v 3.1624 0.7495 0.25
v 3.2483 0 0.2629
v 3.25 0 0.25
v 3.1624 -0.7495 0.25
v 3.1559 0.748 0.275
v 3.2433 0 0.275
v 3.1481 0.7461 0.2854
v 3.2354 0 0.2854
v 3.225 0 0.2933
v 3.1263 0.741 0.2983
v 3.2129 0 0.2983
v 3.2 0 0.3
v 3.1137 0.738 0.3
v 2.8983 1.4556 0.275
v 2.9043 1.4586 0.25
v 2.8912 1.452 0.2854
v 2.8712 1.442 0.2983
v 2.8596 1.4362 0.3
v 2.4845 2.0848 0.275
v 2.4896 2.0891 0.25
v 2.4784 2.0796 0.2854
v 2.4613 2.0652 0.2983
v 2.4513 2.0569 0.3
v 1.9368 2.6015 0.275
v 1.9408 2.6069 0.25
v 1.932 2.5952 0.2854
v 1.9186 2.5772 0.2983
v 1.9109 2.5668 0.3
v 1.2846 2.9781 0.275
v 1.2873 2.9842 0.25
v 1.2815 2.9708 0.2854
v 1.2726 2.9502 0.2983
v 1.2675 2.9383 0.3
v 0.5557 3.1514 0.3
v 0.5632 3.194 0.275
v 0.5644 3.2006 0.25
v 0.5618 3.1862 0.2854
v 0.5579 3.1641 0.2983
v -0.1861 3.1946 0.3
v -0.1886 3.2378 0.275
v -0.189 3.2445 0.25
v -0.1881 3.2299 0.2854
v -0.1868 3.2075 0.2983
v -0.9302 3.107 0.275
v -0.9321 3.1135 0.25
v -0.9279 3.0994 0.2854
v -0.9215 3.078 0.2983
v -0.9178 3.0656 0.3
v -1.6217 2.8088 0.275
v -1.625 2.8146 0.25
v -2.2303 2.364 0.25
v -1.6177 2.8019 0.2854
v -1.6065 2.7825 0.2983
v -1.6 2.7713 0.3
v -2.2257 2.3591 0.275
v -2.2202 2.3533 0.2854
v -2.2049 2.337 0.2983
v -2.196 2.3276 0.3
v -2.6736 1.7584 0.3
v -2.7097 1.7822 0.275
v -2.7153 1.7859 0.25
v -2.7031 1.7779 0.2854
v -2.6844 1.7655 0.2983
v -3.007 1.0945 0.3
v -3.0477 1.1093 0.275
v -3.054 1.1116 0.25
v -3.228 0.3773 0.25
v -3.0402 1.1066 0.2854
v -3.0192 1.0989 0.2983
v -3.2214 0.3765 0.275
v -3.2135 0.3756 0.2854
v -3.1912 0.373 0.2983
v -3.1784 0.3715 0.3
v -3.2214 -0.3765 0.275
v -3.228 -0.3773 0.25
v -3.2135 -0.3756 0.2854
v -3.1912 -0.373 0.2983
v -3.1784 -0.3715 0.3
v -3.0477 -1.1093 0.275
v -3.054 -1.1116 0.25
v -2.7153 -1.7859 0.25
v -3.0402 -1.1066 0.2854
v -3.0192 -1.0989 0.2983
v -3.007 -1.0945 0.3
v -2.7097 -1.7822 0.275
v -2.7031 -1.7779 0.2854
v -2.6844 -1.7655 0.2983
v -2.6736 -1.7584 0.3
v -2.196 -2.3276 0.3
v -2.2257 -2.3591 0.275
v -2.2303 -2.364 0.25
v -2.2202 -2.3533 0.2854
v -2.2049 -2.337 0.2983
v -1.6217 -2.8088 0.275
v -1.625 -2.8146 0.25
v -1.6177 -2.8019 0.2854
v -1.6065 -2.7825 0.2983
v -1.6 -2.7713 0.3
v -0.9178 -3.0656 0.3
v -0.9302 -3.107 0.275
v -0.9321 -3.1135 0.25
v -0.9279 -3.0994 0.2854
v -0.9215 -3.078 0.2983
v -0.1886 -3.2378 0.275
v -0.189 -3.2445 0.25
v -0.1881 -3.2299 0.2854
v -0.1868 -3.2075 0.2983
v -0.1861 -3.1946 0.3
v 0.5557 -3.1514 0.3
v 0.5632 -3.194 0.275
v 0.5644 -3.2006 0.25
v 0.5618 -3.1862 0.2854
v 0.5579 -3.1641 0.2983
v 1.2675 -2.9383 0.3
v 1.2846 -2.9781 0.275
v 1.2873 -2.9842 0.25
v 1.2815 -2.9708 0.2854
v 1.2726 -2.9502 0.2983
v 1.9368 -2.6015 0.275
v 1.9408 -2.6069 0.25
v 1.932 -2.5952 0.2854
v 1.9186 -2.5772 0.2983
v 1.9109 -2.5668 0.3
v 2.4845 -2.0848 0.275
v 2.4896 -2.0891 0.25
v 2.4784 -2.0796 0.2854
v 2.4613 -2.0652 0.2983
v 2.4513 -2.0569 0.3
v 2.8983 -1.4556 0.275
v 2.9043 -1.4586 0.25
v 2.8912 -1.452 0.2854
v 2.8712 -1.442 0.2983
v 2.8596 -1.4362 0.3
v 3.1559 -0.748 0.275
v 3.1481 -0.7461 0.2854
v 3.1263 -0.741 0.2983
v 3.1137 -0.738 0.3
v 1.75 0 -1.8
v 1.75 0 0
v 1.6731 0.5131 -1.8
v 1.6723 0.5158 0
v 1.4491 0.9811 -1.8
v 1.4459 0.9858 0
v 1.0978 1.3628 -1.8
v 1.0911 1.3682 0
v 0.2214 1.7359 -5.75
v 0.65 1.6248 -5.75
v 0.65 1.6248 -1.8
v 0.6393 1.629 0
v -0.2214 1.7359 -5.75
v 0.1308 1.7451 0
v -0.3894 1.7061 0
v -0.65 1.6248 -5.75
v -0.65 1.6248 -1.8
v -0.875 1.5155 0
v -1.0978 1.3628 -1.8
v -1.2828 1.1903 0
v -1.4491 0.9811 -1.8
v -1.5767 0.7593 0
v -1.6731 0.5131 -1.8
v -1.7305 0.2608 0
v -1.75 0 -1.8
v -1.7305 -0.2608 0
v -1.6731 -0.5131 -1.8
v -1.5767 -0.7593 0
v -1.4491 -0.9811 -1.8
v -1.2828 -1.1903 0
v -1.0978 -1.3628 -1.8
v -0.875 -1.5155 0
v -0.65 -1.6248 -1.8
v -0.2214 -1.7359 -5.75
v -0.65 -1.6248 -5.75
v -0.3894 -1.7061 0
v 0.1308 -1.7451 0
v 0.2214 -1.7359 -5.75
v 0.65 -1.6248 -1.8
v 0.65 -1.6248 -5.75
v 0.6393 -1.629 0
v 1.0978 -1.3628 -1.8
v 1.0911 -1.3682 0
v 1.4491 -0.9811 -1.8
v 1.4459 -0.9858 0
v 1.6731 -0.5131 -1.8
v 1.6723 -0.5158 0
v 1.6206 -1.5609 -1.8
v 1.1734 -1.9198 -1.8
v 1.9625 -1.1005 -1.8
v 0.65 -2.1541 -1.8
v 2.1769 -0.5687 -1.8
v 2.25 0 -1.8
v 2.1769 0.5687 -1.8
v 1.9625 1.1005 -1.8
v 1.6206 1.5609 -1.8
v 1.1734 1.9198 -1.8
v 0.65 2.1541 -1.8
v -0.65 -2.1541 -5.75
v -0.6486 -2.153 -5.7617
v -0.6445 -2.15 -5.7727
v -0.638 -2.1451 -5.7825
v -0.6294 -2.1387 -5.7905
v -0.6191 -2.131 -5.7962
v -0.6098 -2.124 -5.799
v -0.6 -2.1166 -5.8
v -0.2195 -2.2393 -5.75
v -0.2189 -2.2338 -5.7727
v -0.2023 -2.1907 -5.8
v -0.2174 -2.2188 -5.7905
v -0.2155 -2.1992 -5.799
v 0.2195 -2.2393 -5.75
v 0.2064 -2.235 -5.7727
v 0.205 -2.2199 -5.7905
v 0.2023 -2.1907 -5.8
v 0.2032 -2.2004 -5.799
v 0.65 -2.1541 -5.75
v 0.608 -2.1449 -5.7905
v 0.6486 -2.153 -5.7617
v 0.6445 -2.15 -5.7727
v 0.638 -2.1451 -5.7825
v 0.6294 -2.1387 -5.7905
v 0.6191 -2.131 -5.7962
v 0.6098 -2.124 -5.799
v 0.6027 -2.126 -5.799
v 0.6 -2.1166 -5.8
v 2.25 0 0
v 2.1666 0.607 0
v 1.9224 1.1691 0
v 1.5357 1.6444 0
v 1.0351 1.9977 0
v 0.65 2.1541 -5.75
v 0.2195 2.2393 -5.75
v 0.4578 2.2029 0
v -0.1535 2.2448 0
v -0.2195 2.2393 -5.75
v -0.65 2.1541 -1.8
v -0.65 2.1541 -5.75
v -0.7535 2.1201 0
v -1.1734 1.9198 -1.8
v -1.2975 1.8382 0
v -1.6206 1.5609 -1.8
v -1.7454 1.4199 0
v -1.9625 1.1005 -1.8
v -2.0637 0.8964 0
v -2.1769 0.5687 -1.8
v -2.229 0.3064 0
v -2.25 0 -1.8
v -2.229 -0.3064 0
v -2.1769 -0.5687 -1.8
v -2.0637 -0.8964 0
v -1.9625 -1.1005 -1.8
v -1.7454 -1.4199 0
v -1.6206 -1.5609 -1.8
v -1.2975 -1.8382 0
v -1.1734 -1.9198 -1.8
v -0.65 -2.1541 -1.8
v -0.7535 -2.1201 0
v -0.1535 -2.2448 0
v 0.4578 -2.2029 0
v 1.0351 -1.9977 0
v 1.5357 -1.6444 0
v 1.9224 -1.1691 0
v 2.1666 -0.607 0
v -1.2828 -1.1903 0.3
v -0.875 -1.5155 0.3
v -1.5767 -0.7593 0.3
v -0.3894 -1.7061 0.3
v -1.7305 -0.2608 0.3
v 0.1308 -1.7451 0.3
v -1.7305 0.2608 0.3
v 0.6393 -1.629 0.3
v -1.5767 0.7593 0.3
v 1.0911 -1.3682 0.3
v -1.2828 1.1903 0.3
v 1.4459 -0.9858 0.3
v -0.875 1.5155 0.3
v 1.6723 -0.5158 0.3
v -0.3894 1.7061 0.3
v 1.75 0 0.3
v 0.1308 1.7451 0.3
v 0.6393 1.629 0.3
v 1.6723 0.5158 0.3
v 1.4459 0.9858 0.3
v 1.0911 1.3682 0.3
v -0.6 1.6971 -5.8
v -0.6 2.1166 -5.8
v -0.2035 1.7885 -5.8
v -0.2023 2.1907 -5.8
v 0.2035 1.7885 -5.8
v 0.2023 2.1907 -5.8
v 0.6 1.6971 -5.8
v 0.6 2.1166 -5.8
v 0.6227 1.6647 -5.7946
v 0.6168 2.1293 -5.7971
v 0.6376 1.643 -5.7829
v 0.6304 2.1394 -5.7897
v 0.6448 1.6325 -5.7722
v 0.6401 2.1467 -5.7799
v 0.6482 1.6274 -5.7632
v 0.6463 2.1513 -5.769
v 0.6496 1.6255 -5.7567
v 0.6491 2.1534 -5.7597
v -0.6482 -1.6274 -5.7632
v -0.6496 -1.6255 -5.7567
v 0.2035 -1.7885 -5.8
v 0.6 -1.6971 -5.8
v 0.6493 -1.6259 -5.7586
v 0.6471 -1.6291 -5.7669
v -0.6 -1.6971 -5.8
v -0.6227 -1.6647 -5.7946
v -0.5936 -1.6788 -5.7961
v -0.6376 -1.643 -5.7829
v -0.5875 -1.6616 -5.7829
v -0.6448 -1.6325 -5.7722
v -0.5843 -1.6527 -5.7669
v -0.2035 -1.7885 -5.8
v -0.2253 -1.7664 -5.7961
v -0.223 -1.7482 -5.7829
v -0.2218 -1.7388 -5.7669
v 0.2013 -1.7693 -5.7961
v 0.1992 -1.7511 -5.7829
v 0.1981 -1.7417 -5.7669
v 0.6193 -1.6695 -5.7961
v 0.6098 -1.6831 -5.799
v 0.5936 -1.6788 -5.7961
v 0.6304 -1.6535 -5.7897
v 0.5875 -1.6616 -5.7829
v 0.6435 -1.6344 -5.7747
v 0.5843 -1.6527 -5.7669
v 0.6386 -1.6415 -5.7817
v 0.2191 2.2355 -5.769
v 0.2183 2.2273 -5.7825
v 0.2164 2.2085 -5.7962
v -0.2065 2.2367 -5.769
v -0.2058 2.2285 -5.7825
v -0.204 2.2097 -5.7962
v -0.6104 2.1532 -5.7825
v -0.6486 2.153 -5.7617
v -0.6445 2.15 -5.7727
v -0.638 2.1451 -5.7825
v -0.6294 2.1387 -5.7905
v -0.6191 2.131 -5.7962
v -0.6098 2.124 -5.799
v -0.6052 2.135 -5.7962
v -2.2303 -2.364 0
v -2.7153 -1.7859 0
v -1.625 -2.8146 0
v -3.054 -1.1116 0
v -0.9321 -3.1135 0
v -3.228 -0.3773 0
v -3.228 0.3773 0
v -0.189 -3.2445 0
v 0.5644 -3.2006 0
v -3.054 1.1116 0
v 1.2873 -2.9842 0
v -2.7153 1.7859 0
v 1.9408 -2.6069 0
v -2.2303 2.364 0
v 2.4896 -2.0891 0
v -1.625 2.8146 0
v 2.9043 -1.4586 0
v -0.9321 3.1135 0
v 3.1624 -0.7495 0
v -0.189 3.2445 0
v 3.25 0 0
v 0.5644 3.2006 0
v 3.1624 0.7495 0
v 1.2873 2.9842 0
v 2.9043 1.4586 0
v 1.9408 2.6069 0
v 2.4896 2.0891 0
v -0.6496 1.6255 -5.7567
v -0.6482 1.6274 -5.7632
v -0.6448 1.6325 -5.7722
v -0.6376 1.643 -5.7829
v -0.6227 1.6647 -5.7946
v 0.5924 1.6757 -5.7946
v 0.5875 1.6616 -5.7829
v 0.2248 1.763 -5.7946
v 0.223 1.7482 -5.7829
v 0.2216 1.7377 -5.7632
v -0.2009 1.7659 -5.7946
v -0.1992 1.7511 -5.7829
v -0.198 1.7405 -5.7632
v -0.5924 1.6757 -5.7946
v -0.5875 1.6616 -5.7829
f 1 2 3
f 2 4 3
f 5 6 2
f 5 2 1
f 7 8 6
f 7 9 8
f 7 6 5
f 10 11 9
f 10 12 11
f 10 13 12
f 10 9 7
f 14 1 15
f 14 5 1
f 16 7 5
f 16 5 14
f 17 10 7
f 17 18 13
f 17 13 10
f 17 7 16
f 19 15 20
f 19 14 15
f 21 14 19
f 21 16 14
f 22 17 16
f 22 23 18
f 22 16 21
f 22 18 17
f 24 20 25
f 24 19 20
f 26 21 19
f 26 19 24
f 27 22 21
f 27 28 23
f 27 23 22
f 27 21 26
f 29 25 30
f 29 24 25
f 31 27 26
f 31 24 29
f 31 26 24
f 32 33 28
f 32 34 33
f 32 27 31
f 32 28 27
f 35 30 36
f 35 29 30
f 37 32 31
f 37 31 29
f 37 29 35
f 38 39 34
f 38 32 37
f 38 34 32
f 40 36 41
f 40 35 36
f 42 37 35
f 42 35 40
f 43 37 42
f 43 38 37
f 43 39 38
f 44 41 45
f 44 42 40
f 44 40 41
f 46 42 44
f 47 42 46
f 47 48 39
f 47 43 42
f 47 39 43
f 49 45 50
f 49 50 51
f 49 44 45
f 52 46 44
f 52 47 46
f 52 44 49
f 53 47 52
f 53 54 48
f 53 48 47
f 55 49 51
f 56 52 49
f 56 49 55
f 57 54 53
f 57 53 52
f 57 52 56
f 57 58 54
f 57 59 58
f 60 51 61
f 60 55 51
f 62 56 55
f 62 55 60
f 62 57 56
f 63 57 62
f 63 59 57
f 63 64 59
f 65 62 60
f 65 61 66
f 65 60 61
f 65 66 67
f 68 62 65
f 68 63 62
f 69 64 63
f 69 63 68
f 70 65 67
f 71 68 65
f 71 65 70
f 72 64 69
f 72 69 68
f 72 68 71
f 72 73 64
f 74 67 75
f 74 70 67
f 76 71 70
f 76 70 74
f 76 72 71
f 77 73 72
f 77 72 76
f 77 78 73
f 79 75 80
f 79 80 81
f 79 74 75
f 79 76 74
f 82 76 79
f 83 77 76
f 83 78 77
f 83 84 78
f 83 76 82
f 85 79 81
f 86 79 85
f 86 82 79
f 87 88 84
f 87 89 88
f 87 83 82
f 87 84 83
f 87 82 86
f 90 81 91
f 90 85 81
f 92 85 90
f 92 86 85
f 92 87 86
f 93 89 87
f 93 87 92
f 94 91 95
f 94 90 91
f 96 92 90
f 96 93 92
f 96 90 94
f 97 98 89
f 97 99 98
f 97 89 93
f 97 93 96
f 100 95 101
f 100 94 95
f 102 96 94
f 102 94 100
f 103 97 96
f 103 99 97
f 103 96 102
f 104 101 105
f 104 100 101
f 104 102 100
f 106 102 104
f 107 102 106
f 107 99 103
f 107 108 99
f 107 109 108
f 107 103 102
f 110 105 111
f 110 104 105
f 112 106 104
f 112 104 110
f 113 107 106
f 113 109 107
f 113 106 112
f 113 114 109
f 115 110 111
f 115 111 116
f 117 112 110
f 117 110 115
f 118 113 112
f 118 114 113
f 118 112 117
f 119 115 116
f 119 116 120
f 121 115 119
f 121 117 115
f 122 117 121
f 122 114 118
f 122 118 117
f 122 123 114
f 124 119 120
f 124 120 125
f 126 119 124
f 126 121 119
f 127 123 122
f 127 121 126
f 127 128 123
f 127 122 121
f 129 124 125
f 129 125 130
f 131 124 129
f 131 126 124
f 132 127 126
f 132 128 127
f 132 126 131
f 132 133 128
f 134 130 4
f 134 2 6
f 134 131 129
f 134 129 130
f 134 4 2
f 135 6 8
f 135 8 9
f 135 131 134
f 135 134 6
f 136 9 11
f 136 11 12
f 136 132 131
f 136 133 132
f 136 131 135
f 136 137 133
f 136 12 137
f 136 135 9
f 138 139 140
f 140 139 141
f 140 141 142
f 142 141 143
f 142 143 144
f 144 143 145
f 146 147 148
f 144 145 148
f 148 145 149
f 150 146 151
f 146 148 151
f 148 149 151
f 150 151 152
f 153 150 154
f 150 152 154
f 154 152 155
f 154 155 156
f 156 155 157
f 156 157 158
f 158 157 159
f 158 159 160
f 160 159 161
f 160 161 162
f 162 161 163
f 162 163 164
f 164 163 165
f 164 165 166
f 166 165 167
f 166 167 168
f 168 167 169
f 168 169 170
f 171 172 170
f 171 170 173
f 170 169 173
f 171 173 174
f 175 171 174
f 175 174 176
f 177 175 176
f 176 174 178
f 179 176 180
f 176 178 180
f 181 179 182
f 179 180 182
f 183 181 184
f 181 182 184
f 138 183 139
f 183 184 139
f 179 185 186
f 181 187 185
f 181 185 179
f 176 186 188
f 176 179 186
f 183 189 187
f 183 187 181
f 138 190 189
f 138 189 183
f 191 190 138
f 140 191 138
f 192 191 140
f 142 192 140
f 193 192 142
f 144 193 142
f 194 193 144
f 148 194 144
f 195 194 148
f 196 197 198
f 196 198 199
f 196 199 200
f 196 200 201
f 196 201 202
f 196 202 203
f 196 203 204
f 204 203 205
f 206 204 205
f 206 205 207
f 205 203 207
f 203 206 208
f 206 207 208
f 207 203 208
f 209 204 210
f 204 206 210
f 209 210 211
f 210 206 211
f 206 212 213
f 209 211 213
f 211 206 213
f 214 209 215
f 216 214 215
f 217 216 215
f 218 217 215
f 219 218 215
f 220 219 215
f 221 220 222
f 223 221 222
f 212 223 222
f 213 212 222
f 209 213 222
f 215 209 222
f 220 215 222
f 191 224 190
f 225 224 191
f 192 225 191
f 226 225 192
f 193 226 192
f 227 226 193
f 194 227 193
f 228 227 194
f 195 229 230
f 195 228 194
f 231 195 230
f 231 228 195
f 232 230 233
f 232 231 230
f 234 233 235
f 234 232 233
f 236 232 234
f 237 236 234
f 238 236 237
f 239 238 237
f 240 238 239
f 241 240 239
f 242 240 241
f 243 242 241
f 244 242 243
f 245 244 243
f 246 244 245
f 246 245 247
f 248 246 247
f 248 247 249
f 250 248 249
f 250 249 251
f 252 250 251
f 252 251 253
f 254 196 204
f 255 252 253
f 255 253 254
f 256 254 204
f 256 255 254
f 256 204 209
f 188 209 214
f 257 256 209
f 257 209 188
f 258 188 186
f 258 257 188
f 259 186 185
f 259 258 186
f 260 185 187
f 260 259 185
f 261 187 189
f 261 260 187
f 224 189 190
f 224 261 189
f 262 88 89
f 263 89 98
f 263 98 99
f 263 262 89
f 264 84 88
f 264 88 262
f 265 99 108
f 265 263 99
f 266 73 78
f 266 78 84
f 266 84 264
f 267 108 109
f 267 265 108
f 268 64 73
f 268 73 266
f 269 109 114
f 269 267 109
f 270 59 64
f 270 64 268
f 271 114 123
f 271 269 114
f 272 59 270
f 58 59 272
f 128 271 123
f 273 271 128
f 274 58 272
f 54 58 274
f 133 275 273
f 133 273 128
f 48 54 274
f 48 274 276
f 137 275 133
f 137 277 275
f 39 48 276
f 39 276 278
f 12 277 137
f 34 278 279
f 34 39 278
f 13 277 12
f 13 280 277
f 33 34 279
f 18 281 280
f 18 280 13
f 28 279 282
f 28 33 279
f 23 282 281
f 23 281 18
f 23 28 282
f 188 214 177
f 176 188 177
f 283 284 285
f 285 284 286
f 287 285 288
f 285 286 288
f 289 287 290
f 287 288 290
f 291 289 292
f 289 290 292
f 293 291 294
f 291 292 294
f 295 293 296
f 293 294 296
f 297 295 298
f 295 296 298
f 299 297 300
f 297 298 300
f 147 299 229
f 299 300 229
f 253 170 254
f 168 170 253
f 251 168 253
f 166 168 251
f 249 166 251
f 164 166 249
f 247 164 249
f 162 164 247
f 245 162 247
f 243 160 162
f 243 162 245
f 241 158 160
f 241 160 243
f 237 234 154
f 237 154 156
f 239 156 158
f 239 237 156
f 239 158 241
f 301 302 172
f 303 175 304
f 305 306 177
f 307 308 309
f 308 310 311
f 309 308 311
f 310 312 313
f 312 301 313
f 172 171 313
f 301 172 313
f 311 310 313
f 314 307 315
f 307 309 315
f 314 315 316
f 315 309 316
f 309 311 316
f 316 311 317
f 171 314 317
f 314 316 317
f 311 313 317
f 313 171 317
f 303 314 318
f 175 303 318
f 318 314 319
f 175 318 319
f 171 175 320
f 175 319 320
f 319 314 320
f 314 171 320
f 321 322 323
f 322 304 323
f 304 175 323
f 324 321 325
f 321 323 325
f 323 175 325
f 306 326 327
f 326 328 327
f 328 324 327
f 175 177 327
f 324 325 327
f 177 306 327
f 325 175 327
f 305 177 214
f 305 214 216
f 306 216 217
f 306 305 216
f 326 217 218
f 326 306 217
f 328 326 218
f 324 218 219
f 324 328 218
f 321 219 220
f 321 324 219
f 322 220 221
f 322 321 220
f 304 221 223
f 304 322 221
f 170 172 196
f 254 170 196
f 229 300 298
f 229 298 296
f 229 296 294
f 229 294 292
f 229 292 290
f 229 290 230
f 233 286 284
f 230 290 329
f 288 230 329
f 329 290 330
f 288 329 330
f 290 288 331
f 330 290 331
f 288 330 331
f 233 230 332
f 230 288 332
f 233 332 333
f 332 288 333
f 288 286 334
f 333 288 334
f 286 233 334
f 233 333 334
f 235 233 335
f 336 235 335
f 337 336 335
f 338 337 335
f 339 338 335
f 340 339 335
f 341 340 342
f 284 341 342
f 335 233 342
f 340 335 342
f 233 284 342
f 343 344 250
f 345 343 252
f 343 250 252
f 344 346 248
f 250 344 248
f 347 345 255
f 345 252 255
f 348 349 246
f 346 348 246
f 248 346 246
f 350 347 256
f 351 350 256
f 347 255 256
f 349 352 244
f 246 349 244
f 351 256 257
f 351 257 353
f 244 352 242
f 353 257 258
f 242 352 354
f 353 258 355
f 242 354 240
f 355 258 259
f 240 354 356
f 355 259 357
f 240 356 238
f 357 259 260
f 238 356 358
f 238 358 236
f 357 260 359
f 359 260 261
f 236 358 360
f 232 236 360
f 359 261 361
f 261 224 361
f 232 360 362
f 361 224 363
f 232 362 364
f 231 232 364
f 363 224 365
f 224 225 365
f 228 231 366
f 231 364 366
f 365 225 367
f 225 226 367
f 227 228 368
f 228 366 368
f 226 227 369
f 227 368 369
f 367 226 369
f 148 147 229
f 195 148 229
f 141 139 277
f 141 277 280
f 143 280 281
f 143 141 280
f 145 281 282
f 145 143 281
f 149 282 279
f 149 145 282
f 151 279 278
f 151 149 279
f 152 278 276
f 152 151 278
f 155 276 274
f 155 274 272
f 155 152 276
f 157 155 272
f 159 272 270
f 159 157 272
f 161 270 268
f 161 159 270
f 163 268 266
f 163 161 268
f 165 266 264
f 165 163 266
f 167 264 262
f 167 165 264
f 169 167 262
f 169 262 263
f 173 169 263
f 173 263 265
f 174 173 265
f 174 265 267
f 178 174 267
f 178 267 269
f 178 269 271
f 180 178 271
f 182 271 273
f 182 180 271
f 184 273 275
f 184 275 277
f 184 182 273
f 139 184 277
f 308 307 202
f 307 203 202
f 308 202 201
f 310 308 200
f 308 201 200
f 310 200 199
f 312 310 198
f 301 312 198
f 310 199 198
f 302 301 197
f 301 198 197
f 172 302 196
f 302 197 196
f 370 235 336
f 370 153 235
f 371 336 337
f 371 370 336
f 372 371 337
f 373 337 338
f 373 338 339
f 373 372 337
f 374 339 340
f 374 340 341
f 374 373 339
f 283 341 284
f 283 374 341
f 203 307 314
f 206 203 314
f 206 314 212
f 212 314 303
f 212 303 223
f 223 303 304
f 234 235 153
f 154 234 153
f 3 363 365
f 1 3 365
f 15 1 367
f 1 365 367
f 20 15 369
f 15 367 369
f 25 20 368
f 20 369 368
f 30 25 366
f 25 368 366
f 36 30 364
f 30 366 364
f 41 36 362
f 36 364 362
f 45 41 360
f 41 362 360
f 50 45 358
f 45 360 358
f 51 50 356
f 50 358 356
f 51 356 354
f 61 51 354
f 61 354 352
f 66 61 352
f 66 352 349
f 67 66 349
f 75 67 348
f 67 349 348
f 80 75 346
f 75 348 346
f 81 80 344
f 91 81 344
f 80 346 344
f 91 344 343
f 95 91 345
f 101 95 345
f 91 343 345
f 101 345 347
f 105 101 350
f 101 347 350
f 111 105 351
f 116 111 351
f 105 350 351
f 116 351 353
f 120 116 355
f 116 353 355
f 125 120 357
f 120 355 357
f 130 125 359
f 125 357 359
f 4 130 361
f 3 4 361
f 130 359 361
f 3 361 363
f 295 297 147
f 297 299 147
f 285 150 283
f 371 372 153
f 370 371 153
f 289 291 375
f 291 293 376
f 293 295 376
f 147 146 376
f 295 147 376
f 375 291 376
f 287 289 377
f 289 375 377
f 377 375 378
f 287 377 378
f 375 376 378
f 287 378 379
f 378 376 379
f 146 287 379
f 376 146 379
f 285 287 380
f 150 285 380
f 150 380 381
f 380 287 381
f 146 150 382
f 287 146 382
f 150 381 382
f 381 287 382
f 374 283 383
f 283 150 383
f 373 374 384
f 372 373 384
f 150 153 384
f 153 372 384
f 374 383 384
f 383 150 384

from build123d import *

# Parameters (mm, degrees)
SKETCH_1_R          = 3.25
SKETCH_1_R_2        = 2.25
SKETCH_1_R_3        = 1.75
EXTRUDE_1_DEPTH     = 0.3
SKETCH_1_4_R        = 2.25
SKETCH_1_4_R_2      = 1.75
EXTRUDE_2_DEPTH     = 5.8
CUT_EXTRUDE_1_DEPTH = 4
FILLET_1_R          = 0.05


with BuildPart() as part:
    # Sketch 1 → Extrude 1 (new body)
    with BuildSketch(Plane.XY):
        Circle(SKETCH_1_R)
        Circle(SKETCH_1_R_2, mode=Mode.SUBTRACT)
        Circle(SKETCH_1_R_2)
        Circle(SKETCH_1_R_3, mode=Mode.SUBTRACT)
    extrude(amount=EXTRUDE_1_DEPTH)

    # Sketch 1_4 → Extrude 2 (add)
    with BuildSketch(Plane.XY):
        Circle(SKETCH_1_4_R)
        Circle(SKETCH_1_4_R_2, mode=Mode.SUBTRACT)
    extrude(amount=-EXTRUDE_2_DEPTH)

    # Sketch 2 → Cut-Extrude 1 (cut)
    with BuildSketch(Plane(origin=(0, 0, -5.8), x_dir=(-1, 0, 0), z_dir=(0, 0, -1))):
        with BuildLine():
            ThreePointArc((-0.65, 2.154065923), (-2.25, 0), (-0.65, -2.154065923))
            Line((-0.65, -2.154065923), (-0.65, -1.624807681))
            ThreePointArc((-0.65, -1.624807681), (-1.75, 0), (-0.65, 1.624807681))
            Line((-0.65, 1.624807681), (-0.65, 2.154065923))
        make_face()
        with BuildLine():
            Line((0.65, -1.624807681), (0.65, -2.154065923))
            ThreePointArc((0.65, -2.154065923), (1.806239187, -1.341640786), (2.25, 0))
            ThreePointArc((2.25, 0), (1.806239187, 1.341640786), (0.65, 2.154065923))
            Line((0.65, 2.154065923), (0.65, 1.624807681))
            ThreePointArc((0.65, 1.624807681), (1.449137675, 0.981070844), (1.75, 0))
            ThreePointArc((1.75, 0), (1.449137675, -0.981070844), (0.65, -1.624807681))
        make_face()
    extrude(amount=-CUT_EXTRUDE_1_DEPTH, mode=Mode.SUBTRACT)

    # Fillet 1
    fillet_1_edges = [part.edges().sort_by_distance(p)[0] for p in [
        (0, 1.75, -5.8),
        (0.65, -1.889436802, -5.8),
        (0.65, 1.889436802, -5.8),
        (0, -1.75, -5.8),
        (0, -2.25, -5.8),
        (-0.65, 1.889436802, -5.8),
        (-0.65, -1.889436802, -5.8),
        (-3.25, 0, 0.3),
        (0, 2.25, -5.8),
    ]]
    fillet(fillet_1_edges, radius=FILLET_1_R)


solid = part.part
